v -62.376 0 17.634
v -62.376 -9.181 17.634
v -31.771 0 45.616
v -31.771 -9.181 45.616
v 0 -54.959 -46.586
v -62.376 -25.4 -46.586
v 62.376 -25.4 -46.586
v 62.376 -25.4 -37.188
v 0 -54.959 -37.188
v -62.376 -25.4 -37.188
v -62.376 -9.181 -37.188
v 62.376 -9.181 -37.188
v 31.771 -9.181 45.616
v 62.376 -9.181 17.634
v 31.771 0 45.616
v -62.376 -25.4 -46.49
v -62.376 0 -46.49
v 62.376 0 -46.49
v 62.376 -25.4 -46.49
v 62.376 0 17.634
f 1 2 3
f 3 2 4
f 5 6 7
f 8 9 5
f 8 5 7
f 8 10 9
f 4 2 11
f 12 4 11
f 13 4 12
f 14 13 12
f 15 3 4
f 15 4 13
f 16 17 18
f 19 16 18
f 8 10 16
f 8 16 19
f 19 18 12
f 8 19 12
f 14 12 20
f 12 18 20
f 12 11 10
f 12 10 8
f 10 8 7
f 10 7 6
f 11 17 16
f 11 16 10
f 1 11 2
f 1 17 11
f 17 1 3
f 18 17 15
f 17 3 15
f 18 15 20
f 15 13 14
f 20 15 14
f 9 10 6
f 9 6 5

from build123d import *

# Parameters (mm, degrees)
F0_W     = 124.7514784336
F0_H     = 92.106230557
F1_DEPTH = 25.4
F2_W     = 124.7514784336
F2_H     = 16.2185247332
F3_DEPTH = 82.804
F5_DEPTH = 25.4
F7_DEPTH = 9.398


with BuildPart() as f1:
    # F0 (on Front) → F1 (new body)
    with BuildSketch(Plane.XZ):
        with Locations((0, -0.4372149706)):
            Rectangle(F0_W, F0_H)
    extrude(amount=F1_DEPTH)

    # F2 (on face) → F3 (cut)
    with BuildSketch(Plane.XY.offset(45.6159003079)):
        with Locations((0, -17.2907376334)):
            Rectangle(F2_W, F2_H)
    extrude(amount=-F3_DEPTH, mode=Mode.SUBTRACT)

    # F4 (on face) → F5 (cut)
    with BuildSketch(Plane.XZ.offset(9.1814752668)):
        Polygon((62.3757392168, 45.6159003079), (31.7708179355, 45.6159003079), (62.3757392168, 17.6342632622), align=None)
        Polygon((-62.3757392168, 17.6342632622), (-31.7708179355, 45.6159003079), (-62.3757392168, 45.6159003079), align=None)
    extrude(amount=-F5_DEPTH, mode=Mode.SUBTRACT)


with BuildPart() as f7:
    # F6 (on face) → F7 (new body)
    with BuildSketch(Plane.XY.offset(-37.1880996921)):
        Polygon((62.3757392168, -25.4), (-62.3757392168, -25.4), (0, -54.9593754113), align=None)
    extrude(amount=-F7_DEPTH)


solid = Compound([f1.part, f7.part])
